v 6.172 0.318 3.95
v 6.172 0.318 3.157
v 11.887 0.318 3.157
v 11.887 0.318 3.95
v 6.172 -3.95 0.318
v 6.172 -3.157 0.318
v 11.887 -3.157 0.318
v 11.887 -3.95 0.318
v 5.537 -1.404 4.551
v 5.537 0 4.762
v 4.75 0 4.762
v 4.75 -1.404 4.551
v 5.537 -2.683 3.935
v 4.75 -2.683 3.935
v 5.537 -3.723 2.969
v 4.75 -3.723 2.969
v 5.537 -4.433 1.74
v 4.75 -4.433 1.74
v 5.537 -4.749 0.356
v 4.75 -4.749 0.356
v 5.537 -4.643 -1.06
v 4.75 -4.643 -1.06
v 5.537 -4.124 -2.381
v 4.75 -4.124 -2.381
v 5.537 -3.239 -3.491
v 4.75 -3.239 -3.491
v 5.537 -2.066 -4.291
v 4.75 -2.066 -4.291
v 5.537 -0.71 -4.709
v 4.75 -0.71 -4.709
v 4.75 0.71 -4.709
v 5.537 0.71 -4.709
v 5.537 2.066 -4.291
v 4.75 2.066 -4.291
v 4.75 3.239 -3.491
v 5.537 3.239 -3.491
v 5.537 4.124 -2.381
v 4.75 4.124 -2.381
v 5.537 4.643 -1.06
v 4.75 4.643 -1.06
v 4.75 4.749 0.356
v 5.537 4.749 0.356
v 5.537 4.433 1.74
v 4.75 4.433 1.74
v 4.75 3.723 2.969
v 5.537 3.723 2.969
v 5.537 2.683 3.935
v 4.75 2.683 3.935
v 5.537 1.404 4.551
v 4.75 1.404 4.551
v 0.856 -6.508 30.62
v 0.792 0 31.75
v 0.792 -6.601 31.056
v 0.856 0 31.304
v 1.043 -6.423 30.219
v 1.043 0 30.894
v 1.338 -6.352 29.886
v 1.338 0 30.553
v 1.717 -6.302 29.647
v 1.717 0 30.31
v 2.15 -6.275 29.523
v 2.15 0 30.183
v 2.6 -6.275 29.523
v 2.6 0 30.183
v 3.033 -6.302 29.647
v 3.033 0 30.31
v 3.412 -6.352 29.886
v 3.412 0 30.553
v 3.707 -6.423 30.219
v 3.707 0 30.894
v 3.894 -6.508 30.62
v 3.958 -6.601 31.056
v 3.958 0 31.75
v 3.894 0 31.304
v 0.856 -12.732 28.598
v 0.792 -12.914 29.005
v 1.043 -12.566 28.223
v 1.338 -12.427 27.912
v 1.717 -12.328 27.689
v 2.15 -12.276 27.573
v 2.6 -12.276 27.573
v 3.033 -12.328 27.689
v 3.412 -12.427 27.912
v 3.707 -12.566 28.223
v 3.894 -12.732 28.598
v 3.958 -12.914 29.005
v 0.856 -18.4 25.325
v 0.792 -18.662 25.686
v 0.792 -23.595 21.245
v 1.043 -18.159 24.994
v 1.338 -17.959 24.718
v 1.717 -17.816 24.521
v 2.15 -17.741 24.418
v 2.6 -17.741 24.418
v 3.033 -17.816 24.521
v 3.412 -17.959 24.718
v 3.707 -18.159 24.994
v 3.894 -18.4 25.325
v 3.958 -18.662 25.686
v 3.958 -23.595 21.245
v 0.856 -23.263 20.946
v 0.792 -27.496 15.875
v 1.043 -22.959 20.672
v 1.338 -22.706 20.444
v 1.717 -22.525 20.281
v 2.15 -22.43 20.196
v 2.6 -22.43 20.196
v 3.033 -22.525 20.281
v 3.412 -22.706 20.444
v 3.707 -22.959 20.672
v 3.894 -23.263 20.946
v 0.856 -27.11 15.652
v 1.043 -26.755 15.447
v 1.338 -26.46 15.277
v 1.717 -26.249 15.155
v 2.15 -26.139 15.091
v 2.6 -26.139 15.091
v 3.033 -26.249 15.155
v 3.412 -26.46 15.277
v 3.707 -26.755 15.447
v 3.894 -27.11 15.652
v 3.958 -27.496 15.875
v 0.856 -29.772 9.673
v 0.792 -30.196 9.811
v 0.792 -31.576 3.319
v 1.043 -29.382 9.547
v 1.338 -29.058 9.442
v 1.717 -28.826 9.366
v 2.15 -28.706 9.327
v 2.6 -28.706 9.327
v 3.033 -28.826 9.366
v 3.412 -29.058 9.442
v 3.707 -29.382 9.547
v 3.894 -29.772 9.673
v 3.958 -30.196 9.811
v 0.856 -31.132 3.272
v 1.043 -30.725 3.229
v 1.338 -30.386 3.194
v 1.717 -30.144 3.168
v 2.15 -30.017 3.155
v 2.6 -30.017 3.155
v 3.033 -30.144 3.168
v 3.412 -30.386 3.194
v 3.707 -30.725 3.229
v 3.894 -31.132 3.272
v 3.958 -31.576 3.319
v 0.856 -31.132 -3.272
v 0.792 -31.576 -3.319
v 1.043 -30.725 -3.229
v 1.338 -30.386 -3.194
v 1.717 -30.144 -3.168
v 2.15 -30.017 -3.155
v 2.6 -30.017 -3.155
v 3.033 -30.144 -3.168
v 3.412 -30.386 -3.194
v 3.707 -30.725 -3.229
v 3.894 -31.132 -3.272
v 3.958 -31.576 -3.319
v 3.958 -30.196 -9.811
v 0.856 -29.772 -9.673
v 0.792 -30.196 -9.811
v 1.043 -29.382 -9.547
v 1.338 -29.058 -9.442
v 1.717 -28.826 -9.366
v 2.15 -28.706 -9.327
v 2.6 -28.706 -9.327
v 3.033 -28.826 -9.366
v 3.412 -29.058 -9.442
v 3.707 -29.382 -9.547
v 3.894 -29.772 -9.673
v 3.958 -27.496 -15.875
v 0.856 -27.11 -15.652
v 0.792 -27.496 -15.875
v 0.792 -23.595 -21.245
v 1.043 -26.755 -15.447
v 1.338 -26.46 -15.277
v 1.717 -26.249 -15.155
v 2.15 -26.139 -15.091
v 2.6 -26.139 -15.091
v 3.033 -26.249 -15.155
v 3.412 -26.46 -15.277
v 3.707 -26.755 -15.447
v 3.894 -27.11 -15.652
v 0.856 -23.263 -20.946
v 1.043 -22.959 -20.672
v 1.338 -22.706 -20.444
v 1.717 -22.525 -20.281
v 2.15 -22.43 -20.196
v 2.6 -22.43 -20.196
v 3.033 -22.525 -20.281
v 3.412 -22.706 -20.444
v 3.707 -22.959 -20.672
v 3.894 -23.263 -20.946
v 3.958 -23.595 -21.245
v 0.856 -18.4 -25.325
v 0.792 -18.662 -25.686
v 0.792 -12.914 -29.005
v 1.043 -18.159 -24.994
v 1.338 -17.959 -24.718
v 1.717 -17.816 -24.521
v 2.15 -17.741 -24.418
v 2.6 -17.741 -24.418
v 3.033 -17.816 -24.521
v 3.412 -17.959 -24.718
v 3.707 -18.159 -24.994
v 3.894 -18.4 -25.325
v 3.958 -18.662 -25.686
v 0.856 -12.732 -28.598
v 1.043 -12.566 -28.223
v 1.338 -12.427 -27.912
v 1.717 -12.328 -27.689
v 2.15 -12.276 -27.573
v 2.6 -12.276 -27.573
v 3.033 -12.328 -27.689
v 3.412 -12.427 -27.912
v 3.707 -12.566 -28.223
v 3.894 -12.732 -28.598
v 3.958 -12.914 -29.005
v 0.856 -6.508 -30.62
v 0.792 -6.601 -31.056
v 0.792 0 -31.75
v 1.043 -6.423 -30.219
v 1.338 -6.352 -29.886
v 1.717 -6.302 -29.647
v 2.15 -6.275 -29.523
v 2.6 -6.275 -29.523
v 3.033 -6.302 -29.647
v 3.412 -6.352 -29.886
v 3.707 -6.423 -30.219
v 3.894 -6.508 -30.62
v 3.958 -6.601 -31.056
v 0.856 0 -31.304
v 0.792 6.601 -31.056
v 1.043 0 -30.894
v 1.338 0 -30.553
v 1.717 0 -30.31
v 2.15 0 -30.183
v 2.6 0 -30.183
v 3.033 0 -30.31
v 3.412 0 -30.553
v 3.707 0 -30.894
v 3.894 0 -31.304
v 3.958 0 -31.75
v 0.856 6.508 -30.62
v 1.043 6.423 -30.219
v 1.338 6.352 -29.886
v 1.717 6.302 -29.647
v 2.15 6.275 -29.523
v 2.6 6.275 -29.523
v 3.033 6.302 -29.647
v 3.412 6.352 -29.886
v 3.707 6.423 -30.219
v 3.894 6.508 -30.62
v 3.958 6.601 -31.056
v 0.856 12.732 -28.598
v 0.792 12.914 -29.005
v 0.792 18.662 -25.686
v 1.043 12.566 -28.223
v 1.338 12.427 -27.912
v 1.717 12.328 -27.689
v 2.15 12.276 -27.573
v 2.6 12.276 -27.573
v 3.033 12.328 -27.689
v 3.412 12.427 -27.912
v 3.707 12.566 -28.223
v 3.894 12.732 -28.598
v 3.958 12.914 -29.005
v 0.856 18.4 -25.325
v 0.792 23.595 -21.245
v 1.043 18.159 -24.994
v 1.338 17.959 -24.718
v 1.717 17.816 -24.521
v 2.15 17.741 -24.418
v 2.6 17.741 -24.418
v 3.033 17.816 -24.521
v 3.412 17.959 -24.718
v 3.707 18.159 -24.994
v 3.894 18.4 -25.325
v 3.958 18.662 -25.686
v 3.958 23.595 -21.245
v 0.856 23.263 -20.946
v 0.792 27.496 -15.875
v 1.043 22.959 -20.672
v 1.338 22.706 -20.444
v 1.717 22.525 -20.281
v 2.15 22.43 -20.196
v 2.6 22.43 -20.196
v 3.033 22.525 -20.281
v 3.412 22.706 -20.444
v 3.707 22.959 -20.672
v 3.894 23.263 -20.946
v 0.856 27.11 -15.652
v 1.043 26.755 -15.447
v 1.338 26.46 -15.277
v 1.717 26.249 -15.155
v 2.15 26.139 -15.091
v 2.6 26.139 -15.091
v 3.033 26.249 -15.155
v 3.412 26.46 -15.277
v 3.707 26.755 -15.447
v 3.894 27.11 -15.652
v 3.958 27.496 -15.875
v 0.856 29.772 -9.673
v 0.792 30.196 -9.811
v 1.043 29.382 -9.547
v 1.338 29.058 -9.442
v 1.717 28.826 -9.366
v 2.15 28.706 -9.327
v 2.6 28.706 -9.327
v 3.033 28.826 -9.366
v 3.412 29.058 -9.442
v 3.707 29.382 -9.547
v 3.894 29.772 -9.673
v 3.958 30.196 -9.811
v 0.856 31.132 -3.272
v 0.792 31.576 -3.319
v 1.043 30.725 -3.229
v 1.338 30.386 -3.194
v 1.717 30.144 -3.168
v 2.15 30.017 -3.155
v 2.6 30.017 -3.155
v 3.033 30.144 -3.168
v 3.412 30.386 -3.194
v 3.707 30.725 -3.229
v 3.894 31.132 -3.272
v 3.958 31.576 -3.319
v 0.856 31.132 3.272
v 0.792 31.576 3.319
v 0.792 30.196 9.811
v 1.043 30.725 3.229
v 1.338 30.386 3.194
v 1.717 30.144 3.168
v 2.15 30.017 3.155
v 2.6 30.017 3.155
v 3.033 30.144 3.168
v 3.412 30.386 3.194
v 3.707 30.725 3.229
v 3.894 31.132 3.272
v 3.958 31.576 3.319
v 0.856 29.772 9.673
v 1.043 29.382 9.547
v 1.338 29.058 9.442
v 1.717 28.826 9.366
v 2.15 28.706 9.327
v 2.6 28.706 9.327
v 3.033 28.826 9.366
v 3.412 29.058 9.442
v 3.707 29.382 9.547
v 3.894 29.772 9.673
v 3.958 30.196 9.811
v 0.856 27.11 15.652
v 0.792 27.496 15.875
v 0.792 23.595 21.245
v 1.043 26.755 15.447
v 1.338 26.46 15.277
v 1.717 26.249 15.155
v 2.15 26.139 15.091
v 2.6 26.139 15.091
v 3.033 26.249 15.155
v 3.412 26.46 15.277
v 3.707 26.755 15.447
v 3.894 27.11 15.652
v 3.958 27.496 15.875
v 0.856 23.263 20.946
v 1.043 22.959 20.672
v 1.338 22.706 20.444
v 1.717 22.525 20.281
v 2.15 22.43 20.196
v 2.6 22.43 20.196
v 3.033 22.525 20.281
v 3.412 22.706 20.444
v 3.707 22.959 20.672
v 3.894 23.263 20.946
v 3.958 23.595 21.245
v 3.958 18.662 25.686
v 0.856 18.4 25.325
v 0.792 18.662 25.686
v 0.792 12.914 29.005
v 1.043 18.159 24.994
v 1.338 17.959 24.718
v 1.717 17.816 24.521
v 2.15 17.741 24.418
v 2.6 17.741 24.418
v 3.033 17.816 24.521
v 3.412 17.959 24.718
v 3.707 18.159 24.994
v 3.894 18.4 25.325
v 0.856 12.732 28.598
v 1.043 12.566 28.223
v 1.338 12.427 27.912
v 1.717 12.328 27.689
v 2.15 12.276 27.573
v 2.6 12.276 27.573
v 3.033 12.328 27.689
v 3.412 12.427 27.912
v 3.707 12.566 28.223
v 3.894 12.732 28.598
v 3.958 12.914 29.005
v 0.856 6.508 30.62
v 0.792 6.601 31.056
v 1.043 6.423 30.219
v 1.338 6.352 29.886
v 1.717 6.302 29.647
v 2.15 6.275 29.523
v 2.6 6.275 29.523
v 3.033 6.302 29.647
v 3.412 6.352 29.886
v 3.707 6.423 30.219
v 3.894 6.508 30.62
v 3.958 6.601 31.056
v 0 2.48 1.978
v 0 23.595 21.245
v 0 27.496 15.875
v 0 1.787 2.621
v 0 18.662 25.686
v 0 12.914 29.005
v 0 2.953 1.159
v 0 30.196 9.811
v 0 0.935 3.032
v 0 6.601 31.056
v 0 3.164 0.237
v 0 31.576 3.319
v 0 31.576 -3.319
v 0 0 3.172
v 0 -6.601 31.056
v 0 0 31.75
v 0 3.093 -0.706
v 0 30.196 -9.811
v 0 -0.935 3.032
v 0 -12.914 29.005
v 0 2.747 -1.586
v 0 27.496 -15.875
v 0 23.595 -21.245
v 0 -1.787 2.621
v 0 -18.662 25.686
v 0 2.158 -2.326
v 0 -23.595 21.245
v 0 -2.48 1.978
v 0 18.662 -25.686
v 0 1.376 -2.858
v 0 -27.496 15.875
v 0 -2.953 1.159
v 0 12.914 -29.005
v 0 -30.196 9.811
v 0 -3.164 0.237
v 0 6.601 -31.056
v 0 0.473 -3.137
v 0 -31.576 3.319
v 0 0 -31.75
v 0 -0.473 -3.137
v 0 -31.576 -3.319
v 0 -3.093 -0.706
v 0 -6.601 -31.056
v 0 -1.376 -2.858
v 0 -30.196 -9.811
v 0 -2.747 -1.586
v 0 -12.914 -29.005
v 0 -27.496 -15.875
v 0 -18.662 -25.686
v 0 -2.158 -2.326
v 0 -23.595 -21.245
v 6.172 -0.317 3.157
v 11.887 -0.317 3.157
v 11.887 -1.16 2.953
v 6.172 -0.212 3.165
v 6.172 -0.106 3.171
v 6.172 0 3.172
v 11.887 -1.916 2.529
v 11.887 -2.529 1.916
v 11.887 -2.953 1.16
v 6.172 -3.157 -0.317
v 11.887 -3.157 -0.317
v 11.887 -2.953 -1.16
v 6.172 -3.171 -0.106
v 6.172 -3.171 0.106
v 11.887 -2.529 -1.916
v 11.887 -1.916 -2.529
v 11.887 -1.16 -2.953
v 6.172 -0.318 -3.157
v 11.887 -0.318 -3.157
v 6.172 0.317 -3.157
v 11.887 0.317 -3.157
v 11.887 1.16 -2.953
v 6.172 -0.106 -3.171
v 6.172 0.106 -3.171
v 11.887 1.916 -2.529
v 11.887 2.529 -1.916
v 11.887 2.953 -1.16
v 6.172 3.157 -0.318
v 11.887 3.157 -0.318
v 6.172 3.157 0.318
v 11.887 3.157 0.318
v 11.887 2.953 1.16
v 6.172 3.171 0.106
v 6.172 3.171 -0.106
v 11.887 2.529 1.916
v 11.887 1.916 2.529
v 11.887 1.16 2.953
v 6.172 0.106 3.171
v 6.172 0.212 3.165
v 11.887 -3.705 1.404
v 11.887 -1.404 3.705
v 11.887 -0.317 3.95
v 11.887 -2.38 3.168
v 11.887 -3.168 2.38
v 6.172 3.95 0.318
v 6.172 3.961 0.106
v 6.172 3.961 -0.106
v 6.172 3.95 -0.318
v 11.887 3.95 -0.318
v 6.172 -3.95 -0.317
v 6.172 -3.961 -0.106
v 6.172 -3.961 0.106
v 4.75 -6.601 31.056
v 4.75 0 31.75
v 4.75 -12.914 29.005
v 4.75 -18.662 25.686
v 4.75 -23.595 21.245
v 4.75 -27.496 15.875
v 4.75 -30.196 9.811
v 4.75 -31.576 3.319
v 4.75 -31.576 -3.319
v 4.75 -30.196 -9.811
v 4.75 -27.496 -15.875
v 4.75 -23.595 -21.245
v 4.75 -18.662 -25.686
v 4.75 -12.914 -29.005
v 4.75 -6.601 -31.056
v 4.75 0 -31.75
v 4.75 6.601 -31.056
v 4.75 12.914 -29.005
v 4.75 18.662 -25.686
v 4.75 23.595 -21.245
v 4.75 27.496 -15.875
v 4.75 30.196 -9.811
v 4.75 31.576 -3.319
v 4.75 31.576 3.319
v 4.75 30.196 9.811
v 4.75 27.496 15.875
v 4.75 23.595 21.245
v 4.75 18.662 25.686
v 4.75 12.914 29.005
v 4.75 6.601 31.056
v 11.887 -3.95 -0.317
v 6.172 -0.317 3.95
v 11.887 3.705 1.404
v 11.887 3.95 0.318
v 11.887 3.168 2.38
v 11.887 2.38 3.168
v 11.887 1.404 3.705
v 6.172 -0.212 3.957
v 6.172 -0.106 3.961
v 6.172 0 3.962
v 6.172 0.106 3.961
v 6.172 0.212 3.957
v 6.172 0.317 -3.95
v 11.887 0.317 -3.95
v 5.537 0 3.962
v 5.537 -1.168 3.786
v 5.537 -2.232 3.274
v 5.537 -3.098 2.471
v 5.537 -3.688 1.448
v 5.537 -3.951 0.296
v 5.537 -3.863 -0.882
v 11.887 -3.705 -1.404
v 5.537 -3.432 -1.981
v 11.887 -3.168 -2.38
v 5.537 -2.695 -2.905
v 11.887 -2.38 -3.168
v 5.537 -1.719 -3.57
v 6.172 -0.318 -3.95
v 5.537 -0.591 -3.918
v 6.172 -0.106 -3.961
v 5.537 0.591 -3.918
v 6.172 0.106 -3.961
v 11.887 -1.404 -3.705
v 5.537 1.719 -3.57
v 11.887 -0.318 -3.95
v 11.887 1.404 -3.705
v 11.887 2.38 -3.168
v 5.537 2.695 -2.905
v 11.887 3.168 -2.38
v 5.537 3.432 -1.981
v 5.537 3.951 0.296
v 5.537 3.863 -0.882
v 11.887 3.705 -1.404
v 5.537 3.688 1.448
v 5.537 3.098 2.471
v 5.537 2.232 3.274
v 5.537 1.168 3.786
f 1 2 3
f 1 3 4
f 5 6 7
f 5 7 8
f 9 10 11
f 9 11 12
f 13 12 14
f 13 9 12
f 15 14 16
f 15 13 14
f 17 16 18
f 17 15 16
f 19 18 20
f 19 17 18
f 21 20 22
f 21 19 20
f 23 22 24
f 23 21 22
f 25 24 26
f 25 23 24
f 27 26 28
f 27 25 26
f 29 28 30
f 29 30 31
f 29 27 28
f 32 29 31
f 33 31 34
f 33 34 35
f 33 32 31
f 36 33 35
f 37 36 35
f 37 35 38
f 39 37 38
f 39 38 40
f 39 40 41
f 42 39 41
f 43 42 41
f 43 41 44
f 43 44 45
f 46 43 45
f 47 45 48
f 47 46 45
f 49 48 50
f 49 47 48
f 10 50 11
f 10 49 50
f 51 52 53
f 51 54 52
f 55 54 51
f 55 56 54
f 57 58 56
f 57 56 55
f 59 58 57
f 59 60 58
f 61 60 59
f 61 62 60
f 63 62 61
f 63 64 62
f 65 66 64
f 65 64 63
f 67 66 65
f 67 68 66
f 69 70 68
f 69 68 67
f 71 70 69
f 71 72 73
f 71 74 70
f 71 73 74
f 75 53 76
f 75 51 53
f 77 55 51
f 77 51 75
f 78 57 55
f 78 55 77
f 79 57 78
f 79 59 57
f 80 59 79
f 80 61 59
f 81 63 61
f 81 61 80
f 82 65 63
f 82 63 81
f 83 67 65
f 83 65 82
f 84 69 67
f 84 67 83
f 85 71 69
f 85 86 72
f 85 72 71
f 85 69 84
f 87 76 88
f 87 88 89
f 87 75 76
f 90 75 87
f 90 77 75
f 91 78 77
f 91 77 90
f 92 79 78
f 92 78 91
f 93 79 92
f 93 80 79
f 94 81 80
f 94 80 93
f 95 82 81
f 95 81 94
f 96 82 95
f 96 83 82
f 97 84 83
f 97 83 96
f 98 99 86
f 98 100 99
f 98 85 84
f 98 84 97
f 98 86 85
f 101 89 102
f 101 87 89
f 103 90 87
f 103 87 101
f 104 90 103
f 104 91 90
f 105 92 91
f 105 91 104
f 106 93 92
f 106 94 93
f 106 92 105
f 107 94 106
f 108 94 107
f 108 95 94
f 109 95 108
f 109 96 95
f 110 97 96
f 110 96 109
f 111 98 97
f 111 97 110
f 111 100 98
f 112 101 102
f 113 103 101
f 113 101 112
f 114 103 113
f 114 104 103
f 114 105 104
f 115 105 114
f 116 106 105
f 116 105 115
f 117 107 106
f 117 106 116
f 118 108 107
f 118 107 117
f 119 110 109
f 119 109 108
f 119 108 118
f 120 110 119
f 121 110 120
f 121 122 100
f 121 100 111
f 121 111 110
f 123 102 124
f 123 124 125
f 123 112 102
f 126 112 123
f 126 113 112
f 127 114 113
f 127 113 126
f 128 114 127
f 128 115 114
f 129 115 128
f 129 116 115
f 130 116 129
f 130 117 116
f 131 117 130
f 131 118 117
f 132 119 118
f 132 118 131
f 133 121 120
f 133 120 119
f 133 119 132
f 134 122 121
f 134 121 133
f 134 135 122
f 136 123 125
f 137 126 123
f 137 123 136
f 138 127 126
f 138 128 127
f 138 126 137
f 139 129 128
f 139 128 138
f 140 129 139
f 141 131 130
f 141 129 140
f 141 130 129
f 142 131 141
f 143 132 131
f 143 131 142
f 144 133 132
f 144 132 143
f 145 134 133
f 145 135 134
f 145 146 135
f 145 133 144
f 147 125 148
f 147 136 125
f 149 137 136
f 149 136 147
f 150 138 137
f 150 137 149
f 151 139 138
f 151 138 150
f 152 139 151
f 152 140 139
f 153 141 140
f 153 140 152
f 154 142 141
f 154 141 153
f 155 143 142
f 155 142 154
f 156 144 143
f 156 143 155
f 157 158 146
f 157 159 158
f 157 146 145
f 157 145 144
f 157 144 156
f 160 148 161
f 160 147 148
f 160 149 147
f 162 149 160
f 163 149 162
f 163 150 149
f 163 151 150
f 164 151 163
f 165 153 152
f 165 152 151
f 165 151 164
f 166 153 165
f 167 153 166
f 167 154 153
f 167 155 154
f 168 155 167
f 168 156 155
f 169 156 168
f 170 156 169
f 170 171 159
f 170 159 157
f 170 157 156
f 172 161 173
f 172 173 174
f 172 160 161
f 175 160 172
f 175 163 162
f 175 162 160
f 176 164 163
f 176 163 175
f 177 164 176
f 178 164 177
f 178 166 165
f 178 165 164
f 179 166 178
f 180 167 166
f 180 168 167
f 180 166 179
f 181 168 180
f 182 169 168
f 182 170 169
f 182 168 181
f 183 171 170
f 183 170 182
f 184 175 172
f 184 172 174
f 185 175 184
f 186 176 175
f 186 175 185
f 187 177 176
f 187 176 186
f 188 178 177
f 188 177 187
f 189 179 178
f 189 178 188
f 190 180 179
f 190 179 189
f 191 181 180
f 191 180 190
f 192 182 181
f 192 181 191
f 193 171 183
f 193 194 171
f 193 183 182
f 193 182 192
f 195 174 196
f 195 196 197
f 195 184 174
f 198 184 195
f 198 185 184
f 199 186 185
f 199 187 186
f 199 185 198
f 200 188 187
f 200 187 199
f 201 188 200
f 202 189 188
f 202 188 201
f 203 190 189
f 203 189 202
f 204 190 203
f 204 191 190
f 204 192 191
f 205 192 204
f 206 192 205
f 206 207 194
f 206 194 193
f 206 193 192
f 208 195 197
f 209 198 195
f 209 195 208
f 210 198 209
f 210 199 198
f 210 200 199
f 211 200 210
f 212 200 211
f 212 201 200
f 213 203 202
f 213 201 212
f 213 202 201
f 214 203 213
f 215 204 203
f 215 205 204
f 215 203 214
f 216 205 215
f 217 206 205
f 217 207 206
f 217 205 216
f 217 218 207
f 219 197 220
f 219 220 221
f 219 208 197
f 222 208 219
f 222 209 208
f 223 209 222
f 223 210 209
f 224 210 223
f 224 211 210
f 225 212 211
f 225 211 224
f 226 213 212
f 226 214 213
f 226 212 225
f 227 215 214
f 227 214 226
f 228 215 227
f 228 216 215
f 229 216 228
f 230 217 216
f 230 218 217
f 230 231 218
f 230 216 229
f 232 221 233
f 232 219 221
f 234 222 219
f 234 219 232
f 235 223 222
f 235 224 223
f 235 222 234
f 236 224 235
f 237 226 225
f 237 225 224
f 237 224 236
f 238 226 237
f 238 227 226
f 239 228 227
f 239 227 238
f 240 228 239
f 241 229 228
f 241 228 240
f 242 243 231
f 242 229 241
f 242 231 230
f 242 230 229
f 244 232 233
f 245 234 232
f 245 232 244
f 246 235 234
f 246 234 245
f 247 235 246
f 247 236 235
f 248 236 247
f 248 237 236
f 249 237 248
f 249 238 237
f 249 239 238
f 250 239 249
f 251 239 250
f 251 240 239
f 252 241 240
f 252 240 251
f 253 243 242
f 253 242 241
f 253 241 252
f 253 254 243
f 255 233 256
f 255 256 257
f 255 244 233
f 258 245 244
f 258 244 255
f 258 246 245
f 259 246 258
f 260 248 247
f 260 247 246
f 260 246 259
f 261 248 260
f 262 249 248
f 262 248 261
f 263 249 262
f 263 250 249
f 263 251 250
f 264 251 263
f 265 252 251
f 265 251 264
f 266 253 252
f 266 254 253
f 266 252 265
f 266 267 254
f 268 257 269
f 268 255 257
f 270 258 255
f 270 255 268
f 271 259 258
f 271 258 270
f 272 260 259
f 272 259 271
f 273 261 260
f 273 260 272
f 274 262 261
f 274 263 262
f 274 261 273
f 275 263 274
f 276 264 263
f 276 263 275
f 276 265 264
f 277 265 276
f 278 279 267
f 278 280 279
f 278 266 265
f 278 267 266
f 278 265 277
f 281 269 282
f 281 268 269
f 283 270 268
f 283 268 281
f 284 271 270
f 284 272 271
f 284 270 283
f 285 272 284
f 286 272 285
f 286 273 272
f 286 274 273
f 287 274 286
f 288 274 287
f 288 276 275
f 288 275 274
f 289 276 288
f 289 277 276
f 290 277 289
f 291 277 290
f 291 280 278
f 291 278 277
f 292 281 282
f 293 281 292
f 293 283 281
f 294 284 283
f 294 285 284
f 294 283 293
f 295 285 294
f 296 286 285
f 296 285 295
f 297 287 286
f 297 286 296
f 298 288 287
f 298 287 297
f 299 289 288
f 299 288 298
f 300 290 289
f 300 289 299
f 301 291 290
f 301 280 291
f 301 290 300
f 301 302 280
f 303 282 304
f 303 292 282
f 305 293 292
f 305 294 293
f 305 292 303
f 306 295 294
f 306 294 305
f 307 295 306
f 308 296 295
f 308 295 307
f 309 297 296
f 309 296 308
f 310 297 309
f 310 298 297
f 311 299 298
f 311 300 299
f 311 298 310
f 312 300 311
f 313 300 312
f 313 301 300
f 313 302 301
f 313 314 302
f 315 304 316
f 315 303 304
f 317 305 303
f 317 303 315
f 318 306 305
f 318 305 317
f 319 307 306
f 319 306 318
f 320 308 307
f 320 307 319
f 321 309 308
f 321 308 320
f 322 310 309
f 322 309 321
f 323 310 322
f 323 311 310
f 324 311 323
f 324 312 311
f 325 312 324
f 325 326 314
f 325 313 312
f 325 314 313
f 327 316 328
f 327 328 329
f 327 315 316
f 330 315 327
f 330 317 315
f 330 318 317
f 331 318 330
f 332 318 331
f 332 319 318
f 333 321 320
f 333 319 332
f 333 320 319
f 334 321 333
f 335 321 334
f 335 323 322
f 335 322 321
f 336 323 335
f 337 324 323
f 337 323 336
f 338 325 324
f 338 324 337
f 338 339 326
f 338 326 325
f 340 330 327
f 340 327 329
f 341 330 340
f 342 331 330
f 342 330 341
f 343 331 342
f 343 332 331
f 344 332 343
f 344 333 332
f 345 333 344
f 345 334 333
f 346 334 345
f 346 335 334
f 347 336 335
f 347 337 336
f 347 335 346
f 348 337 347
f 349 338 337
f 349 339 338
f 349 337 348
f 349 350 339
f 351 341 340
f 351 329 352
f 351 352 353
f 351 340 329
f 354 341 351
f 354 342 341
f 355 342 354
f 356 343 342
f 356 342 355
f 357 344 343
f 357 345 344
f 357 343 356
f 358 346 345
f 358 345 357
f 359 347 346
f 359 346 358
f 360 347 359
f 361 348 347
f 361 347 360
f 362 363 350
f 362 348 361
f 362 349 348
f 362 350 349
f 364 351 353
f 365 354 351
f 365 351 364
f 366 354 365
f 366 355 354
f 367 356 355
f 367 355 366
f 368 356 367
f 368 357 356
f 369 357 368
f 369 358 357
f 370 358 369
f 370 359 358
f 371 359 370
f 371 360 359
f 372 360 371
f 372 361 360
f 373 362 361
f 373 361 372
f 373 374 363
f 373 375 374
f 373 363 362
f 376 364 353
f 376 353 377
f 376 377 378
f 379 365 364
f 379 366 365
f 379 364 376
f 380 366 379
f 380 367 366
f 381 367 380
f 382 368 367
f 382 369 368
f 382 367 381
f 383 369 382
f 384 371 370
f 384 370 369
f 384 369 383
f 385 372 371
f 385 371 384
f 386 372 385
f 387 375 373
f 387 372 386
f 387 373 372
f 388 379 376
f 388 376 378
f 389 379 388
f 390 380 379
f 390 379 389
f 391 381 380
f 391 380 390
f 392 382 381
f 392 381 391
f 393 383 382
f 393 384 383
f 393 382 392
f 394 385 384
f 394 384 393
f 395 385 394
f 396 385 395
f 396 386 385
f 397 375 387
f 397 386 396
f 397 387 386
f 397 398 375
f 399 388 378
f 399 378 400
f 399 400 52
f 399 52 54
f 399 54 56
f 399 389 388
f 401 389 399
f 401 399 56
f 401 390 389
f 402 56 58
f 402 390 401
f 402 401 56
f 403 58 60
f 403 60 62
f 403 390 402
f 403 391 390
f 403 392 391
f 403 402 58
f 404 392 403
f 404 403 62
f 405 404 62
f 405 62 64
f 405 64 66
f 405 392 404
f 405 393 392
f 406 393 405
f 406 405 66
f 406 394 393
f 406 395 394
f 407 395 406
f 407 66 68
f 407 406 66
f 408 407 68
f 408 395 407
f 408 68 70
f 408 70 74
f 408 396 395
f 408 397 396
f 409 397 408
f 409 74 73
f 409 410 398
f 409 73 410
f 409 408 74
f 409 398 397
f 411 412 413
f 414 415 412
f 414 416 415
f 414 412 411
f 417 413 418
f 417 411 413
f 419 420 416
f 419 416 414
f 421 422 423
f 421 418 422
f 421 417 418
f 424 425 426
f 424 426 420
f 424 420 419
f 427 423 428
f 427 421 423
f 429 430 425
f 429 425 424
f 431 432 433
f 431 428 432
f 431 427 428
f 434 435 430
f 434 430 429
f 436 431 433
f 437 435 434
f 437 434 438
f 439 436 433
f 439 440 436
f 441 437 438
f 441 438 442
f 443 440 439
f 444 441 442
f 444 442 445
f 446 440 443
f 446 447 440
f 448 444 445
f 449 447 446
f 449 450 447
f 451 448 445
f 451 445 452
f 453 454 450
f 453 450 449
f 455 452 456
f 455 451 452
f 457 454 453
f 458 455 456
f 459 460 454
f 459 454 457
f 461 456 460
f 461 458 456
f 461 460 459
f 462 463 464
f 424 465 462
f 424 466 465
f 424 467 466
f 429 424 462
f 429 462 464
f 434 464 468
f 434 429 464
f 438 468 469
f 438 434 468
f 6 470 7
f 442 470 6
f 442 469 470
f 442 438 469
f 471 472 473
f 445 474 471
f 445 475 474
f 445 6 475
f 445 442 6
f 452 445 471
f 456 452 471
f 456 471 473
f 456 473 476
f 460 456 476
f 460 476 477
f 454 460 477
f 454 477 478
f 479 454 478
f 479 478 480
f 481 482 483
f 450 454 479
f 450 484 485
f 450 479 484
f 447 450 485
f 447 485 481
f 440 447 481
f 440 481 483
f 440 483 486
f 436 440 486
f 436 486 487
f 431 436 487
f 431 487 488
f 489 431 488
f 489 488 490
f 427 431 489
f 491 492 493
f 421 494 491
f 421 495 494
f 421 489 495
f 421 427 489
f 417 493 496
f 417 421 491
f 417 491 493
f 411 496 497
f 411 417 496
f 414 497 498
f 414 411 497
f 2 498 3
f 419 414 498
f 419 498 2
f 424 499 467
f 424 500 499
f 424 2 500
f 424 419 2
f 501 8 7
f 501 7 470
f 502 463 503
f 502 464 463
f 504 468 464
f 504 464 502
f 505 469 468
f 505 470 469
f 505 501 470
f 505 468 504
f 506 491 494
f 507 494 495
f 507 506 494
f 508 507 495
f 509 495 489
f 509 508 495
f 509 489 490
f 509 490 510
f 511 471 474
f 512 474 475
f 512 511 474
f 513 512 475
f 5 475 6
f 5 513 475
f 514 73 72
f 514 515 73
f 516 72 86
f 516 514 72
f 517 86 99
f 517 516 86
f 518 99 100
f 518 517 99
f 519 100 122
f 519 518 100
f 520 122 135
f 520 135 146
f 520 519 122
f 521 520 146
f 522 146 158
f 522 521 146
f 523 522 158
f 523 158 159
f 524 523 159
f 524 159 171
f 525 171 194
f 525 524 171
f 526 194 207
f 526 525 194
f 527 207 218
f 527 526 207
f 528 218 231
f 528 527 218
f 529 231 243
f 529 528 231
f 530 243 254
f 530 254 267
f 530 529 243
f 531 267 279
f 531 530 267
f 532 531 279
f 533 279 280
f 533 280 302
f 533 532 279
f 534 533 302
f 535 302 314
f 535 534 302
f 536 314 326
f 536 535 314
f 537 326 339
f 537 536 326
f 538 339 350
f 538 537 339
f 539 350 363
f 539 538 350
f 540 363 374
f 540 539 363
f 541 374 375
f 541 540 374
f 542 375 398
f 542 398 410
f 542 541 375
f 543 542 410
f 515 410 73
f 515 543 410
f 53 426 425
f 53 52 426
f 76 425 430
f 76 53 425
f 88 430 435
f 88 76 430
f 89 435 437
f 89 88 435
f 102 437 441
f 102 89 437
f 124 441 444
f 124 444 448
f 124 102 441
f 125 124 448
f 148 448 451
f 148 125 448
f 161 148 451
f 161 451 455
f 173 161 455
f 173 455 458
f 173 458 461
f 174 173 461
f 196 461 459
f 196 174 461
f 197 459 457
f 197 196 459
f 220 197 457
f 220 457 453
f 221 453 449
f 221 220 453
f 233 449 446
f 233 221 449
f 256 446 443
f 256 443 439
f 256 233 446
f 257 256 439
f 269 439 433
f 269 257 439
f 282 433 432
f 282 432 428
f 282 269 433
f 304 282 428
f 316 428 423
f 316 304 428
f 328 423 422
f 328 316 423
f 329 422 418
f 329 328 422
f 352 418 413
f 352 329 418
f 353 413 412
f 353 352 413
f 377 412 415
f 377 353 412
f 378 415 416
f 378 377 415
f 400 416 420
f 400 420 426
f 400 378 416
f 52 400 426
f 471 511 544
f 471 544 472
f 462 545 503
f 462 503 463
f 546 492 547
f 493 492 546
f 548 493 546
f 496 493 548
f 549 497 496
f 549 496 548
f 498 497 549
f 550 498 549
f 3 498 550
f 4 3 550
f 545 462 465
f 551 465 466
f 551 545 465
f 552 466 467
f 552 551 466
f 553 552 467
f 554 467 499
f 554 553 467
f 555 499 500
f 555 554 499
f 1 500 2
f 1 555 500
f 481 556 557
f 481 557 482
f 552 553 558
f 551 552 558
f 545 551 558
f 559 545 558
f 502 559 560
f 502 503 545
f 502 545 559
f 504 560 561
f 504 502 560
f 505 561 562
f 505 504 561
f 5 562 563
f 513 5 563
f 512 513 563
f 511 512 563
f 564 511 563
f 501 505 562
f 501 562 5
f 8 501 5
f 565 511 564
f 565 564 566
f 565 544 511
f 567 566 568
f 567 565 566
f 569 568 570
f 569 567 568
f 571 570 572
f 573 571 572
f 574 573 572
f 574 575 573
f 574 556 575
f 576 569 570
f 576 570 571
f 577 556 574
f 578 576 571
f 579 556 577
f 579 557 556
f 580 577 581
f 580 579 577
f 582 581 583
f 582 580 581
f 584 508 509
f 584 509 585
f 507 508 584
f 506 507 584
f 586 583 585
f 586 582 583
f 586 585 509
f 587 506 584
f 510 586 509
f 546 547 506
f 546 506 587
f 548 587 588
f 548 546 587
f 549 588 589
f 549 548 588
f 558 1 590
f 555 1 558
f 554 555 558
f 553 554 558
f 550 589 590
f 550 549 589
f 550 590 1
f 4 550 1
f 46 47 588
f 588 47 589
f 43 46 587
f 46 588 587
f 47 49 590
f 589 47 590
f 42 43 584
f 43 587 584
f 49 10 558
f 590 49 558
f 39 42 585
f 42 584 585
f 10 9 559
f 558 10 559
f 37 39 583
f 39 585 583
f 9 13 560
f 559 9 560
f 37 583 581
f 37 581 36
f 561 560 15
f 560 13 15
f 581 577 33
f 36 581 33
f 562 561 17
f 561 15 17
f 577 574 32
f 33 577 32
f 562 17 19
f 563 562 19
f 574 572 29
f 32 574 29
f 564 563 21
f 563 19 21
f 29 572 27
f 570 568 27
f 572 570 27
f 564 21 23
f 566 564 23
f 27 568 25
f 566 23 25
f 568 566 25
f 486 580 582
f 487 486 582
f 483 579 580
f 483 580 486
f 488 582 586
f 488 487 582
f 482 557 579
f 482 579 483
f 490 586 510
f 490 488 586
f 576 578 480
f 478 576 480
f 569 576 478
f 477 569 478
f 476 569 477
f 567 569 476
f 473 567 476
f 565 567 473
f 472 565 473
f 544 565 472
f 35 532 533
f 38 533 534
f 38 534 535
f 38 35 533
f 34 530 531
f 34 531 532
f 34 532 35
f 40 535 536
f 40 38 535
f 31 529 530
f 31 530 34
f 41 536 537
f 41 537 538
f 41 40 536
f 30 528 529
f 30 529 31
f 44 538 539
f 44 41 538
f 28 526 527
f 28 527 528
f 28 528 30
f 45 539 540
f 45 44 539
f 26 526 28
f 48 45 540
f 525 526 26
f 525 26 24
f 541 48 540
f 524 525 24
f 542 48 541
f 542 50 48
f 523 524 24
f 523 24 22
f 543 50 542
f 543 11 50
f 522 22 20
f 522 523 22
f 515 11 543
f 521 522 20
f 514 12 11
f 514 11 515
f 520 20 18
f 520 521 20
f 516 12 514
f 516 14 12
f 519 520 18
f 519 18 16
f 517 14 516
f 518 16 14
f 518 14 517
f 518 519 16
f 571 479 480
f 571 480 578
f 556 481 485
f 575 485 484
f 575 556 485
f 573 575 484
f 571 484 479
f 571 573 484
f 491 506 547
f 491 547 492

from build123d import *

# Parameters (mm, degrees)
SKETCH2_W               = 6.35
SKETCH2_H               = 0.8001
CUT_EXTRUDE1_SLOT_START = -5.715
CUT_EXTRUDE1_SLOT_DEPTH = 5.715
CIRPATTERN1_COUNT       = 4


with BuildPart() as part:
    # Sketch1 → Revolve1-MAIN BODY (revolve)
    with BuildSketch(Plane.XY, mode=Mode.PRIVATE) as revolve1_main_body_sk:
        with BuildLine():
            Line((0, 31.75), (0.79155417, 31.75))
            ThreePointArc((0.79155417, 31.75), (2.3749, 30.16665417), (3.95824583, 31.75))
            Line((3.95824583, 31.75), (4.7498, 31.75))
            Line((4.7498, 31.75), (4.7498, 4.7625))
            Line((4.7498, 4.7625), (11.8872, 4.7625))
            Line((11.8872, 4.7625), (11.8872, 3.17246))
            Line((11.8872, 3.17246), (0, 3.17246))
            Line((0, 3.17246), (0, 31.75))
        make_face()
    revolve(revolve1_main_body_sk.sketch.rotate(Axis((0, 0, 0), (1, 0, 0)), 90), axis=Axis((0, 0, 0), (1, 0, 0)))

    # Sketch2 → Cut-Revolve1-SLOT (revolve, cut)
    with BuildSketch(Plane.XY, mode=Mode.PRIVATE) as cut_revolve1_slot_sk:
        with Locations((8.7122, 4.36245)):
            Rectangle(SKETCH2_W, SKETCH2_H)
    revolve(cut_revolve1_slot_sk.sketch.rotate(Axis((0, 0, 0), (1, 0, 0)), 90), axis=Axis((0, 0, 0), (1, 0, 0)), mode=Mode.SUBTRACT)

    # Sketch3 → Cut-Extrude1-SLOT (cut)
    with BuildSketch(Plane(origin=(11.8872, 0, 0), x_dir=(0, 0, -1), z_dir=(1, 0, 0)).offset(CUT_EXTRUDE1_SLOT_START)):
        with BuildLine():
            Line((-0.3175, 3.949659164), (-0.3175, 3.156532306))
            ThreePointArc((-0.3175, 3.156532306), (0, 3.17246), (0.3175, 3.156532306))
            Line((0.3175, 3.156532306), (0.3175, 3.949659164))
            ThreePointArc((0.3175, 3.949659164), (0, 3.9624), (-0.3175, 3.949659164))
        make_face()
    cut_extrude1_slot = extrude(amount=CUT_EXTRUDE1_SLOT_DEPTH, mode=Mode.SUBTRACT)

    # CirPattern1: Cut-Extrude1-SLOT ×4 about axis
    cirpattern1_axis = Axis((0, 0, 0), (1, 0, 0))
    for i in range(1, CIRPATTERN1_COUNT):
        add(cut_extrude1_slot.rotate(cirpattern1_axis, i * 360 / CIRPATTERN1_COUNT), mode=Mode.SUBTRACT)


solid = part.part
